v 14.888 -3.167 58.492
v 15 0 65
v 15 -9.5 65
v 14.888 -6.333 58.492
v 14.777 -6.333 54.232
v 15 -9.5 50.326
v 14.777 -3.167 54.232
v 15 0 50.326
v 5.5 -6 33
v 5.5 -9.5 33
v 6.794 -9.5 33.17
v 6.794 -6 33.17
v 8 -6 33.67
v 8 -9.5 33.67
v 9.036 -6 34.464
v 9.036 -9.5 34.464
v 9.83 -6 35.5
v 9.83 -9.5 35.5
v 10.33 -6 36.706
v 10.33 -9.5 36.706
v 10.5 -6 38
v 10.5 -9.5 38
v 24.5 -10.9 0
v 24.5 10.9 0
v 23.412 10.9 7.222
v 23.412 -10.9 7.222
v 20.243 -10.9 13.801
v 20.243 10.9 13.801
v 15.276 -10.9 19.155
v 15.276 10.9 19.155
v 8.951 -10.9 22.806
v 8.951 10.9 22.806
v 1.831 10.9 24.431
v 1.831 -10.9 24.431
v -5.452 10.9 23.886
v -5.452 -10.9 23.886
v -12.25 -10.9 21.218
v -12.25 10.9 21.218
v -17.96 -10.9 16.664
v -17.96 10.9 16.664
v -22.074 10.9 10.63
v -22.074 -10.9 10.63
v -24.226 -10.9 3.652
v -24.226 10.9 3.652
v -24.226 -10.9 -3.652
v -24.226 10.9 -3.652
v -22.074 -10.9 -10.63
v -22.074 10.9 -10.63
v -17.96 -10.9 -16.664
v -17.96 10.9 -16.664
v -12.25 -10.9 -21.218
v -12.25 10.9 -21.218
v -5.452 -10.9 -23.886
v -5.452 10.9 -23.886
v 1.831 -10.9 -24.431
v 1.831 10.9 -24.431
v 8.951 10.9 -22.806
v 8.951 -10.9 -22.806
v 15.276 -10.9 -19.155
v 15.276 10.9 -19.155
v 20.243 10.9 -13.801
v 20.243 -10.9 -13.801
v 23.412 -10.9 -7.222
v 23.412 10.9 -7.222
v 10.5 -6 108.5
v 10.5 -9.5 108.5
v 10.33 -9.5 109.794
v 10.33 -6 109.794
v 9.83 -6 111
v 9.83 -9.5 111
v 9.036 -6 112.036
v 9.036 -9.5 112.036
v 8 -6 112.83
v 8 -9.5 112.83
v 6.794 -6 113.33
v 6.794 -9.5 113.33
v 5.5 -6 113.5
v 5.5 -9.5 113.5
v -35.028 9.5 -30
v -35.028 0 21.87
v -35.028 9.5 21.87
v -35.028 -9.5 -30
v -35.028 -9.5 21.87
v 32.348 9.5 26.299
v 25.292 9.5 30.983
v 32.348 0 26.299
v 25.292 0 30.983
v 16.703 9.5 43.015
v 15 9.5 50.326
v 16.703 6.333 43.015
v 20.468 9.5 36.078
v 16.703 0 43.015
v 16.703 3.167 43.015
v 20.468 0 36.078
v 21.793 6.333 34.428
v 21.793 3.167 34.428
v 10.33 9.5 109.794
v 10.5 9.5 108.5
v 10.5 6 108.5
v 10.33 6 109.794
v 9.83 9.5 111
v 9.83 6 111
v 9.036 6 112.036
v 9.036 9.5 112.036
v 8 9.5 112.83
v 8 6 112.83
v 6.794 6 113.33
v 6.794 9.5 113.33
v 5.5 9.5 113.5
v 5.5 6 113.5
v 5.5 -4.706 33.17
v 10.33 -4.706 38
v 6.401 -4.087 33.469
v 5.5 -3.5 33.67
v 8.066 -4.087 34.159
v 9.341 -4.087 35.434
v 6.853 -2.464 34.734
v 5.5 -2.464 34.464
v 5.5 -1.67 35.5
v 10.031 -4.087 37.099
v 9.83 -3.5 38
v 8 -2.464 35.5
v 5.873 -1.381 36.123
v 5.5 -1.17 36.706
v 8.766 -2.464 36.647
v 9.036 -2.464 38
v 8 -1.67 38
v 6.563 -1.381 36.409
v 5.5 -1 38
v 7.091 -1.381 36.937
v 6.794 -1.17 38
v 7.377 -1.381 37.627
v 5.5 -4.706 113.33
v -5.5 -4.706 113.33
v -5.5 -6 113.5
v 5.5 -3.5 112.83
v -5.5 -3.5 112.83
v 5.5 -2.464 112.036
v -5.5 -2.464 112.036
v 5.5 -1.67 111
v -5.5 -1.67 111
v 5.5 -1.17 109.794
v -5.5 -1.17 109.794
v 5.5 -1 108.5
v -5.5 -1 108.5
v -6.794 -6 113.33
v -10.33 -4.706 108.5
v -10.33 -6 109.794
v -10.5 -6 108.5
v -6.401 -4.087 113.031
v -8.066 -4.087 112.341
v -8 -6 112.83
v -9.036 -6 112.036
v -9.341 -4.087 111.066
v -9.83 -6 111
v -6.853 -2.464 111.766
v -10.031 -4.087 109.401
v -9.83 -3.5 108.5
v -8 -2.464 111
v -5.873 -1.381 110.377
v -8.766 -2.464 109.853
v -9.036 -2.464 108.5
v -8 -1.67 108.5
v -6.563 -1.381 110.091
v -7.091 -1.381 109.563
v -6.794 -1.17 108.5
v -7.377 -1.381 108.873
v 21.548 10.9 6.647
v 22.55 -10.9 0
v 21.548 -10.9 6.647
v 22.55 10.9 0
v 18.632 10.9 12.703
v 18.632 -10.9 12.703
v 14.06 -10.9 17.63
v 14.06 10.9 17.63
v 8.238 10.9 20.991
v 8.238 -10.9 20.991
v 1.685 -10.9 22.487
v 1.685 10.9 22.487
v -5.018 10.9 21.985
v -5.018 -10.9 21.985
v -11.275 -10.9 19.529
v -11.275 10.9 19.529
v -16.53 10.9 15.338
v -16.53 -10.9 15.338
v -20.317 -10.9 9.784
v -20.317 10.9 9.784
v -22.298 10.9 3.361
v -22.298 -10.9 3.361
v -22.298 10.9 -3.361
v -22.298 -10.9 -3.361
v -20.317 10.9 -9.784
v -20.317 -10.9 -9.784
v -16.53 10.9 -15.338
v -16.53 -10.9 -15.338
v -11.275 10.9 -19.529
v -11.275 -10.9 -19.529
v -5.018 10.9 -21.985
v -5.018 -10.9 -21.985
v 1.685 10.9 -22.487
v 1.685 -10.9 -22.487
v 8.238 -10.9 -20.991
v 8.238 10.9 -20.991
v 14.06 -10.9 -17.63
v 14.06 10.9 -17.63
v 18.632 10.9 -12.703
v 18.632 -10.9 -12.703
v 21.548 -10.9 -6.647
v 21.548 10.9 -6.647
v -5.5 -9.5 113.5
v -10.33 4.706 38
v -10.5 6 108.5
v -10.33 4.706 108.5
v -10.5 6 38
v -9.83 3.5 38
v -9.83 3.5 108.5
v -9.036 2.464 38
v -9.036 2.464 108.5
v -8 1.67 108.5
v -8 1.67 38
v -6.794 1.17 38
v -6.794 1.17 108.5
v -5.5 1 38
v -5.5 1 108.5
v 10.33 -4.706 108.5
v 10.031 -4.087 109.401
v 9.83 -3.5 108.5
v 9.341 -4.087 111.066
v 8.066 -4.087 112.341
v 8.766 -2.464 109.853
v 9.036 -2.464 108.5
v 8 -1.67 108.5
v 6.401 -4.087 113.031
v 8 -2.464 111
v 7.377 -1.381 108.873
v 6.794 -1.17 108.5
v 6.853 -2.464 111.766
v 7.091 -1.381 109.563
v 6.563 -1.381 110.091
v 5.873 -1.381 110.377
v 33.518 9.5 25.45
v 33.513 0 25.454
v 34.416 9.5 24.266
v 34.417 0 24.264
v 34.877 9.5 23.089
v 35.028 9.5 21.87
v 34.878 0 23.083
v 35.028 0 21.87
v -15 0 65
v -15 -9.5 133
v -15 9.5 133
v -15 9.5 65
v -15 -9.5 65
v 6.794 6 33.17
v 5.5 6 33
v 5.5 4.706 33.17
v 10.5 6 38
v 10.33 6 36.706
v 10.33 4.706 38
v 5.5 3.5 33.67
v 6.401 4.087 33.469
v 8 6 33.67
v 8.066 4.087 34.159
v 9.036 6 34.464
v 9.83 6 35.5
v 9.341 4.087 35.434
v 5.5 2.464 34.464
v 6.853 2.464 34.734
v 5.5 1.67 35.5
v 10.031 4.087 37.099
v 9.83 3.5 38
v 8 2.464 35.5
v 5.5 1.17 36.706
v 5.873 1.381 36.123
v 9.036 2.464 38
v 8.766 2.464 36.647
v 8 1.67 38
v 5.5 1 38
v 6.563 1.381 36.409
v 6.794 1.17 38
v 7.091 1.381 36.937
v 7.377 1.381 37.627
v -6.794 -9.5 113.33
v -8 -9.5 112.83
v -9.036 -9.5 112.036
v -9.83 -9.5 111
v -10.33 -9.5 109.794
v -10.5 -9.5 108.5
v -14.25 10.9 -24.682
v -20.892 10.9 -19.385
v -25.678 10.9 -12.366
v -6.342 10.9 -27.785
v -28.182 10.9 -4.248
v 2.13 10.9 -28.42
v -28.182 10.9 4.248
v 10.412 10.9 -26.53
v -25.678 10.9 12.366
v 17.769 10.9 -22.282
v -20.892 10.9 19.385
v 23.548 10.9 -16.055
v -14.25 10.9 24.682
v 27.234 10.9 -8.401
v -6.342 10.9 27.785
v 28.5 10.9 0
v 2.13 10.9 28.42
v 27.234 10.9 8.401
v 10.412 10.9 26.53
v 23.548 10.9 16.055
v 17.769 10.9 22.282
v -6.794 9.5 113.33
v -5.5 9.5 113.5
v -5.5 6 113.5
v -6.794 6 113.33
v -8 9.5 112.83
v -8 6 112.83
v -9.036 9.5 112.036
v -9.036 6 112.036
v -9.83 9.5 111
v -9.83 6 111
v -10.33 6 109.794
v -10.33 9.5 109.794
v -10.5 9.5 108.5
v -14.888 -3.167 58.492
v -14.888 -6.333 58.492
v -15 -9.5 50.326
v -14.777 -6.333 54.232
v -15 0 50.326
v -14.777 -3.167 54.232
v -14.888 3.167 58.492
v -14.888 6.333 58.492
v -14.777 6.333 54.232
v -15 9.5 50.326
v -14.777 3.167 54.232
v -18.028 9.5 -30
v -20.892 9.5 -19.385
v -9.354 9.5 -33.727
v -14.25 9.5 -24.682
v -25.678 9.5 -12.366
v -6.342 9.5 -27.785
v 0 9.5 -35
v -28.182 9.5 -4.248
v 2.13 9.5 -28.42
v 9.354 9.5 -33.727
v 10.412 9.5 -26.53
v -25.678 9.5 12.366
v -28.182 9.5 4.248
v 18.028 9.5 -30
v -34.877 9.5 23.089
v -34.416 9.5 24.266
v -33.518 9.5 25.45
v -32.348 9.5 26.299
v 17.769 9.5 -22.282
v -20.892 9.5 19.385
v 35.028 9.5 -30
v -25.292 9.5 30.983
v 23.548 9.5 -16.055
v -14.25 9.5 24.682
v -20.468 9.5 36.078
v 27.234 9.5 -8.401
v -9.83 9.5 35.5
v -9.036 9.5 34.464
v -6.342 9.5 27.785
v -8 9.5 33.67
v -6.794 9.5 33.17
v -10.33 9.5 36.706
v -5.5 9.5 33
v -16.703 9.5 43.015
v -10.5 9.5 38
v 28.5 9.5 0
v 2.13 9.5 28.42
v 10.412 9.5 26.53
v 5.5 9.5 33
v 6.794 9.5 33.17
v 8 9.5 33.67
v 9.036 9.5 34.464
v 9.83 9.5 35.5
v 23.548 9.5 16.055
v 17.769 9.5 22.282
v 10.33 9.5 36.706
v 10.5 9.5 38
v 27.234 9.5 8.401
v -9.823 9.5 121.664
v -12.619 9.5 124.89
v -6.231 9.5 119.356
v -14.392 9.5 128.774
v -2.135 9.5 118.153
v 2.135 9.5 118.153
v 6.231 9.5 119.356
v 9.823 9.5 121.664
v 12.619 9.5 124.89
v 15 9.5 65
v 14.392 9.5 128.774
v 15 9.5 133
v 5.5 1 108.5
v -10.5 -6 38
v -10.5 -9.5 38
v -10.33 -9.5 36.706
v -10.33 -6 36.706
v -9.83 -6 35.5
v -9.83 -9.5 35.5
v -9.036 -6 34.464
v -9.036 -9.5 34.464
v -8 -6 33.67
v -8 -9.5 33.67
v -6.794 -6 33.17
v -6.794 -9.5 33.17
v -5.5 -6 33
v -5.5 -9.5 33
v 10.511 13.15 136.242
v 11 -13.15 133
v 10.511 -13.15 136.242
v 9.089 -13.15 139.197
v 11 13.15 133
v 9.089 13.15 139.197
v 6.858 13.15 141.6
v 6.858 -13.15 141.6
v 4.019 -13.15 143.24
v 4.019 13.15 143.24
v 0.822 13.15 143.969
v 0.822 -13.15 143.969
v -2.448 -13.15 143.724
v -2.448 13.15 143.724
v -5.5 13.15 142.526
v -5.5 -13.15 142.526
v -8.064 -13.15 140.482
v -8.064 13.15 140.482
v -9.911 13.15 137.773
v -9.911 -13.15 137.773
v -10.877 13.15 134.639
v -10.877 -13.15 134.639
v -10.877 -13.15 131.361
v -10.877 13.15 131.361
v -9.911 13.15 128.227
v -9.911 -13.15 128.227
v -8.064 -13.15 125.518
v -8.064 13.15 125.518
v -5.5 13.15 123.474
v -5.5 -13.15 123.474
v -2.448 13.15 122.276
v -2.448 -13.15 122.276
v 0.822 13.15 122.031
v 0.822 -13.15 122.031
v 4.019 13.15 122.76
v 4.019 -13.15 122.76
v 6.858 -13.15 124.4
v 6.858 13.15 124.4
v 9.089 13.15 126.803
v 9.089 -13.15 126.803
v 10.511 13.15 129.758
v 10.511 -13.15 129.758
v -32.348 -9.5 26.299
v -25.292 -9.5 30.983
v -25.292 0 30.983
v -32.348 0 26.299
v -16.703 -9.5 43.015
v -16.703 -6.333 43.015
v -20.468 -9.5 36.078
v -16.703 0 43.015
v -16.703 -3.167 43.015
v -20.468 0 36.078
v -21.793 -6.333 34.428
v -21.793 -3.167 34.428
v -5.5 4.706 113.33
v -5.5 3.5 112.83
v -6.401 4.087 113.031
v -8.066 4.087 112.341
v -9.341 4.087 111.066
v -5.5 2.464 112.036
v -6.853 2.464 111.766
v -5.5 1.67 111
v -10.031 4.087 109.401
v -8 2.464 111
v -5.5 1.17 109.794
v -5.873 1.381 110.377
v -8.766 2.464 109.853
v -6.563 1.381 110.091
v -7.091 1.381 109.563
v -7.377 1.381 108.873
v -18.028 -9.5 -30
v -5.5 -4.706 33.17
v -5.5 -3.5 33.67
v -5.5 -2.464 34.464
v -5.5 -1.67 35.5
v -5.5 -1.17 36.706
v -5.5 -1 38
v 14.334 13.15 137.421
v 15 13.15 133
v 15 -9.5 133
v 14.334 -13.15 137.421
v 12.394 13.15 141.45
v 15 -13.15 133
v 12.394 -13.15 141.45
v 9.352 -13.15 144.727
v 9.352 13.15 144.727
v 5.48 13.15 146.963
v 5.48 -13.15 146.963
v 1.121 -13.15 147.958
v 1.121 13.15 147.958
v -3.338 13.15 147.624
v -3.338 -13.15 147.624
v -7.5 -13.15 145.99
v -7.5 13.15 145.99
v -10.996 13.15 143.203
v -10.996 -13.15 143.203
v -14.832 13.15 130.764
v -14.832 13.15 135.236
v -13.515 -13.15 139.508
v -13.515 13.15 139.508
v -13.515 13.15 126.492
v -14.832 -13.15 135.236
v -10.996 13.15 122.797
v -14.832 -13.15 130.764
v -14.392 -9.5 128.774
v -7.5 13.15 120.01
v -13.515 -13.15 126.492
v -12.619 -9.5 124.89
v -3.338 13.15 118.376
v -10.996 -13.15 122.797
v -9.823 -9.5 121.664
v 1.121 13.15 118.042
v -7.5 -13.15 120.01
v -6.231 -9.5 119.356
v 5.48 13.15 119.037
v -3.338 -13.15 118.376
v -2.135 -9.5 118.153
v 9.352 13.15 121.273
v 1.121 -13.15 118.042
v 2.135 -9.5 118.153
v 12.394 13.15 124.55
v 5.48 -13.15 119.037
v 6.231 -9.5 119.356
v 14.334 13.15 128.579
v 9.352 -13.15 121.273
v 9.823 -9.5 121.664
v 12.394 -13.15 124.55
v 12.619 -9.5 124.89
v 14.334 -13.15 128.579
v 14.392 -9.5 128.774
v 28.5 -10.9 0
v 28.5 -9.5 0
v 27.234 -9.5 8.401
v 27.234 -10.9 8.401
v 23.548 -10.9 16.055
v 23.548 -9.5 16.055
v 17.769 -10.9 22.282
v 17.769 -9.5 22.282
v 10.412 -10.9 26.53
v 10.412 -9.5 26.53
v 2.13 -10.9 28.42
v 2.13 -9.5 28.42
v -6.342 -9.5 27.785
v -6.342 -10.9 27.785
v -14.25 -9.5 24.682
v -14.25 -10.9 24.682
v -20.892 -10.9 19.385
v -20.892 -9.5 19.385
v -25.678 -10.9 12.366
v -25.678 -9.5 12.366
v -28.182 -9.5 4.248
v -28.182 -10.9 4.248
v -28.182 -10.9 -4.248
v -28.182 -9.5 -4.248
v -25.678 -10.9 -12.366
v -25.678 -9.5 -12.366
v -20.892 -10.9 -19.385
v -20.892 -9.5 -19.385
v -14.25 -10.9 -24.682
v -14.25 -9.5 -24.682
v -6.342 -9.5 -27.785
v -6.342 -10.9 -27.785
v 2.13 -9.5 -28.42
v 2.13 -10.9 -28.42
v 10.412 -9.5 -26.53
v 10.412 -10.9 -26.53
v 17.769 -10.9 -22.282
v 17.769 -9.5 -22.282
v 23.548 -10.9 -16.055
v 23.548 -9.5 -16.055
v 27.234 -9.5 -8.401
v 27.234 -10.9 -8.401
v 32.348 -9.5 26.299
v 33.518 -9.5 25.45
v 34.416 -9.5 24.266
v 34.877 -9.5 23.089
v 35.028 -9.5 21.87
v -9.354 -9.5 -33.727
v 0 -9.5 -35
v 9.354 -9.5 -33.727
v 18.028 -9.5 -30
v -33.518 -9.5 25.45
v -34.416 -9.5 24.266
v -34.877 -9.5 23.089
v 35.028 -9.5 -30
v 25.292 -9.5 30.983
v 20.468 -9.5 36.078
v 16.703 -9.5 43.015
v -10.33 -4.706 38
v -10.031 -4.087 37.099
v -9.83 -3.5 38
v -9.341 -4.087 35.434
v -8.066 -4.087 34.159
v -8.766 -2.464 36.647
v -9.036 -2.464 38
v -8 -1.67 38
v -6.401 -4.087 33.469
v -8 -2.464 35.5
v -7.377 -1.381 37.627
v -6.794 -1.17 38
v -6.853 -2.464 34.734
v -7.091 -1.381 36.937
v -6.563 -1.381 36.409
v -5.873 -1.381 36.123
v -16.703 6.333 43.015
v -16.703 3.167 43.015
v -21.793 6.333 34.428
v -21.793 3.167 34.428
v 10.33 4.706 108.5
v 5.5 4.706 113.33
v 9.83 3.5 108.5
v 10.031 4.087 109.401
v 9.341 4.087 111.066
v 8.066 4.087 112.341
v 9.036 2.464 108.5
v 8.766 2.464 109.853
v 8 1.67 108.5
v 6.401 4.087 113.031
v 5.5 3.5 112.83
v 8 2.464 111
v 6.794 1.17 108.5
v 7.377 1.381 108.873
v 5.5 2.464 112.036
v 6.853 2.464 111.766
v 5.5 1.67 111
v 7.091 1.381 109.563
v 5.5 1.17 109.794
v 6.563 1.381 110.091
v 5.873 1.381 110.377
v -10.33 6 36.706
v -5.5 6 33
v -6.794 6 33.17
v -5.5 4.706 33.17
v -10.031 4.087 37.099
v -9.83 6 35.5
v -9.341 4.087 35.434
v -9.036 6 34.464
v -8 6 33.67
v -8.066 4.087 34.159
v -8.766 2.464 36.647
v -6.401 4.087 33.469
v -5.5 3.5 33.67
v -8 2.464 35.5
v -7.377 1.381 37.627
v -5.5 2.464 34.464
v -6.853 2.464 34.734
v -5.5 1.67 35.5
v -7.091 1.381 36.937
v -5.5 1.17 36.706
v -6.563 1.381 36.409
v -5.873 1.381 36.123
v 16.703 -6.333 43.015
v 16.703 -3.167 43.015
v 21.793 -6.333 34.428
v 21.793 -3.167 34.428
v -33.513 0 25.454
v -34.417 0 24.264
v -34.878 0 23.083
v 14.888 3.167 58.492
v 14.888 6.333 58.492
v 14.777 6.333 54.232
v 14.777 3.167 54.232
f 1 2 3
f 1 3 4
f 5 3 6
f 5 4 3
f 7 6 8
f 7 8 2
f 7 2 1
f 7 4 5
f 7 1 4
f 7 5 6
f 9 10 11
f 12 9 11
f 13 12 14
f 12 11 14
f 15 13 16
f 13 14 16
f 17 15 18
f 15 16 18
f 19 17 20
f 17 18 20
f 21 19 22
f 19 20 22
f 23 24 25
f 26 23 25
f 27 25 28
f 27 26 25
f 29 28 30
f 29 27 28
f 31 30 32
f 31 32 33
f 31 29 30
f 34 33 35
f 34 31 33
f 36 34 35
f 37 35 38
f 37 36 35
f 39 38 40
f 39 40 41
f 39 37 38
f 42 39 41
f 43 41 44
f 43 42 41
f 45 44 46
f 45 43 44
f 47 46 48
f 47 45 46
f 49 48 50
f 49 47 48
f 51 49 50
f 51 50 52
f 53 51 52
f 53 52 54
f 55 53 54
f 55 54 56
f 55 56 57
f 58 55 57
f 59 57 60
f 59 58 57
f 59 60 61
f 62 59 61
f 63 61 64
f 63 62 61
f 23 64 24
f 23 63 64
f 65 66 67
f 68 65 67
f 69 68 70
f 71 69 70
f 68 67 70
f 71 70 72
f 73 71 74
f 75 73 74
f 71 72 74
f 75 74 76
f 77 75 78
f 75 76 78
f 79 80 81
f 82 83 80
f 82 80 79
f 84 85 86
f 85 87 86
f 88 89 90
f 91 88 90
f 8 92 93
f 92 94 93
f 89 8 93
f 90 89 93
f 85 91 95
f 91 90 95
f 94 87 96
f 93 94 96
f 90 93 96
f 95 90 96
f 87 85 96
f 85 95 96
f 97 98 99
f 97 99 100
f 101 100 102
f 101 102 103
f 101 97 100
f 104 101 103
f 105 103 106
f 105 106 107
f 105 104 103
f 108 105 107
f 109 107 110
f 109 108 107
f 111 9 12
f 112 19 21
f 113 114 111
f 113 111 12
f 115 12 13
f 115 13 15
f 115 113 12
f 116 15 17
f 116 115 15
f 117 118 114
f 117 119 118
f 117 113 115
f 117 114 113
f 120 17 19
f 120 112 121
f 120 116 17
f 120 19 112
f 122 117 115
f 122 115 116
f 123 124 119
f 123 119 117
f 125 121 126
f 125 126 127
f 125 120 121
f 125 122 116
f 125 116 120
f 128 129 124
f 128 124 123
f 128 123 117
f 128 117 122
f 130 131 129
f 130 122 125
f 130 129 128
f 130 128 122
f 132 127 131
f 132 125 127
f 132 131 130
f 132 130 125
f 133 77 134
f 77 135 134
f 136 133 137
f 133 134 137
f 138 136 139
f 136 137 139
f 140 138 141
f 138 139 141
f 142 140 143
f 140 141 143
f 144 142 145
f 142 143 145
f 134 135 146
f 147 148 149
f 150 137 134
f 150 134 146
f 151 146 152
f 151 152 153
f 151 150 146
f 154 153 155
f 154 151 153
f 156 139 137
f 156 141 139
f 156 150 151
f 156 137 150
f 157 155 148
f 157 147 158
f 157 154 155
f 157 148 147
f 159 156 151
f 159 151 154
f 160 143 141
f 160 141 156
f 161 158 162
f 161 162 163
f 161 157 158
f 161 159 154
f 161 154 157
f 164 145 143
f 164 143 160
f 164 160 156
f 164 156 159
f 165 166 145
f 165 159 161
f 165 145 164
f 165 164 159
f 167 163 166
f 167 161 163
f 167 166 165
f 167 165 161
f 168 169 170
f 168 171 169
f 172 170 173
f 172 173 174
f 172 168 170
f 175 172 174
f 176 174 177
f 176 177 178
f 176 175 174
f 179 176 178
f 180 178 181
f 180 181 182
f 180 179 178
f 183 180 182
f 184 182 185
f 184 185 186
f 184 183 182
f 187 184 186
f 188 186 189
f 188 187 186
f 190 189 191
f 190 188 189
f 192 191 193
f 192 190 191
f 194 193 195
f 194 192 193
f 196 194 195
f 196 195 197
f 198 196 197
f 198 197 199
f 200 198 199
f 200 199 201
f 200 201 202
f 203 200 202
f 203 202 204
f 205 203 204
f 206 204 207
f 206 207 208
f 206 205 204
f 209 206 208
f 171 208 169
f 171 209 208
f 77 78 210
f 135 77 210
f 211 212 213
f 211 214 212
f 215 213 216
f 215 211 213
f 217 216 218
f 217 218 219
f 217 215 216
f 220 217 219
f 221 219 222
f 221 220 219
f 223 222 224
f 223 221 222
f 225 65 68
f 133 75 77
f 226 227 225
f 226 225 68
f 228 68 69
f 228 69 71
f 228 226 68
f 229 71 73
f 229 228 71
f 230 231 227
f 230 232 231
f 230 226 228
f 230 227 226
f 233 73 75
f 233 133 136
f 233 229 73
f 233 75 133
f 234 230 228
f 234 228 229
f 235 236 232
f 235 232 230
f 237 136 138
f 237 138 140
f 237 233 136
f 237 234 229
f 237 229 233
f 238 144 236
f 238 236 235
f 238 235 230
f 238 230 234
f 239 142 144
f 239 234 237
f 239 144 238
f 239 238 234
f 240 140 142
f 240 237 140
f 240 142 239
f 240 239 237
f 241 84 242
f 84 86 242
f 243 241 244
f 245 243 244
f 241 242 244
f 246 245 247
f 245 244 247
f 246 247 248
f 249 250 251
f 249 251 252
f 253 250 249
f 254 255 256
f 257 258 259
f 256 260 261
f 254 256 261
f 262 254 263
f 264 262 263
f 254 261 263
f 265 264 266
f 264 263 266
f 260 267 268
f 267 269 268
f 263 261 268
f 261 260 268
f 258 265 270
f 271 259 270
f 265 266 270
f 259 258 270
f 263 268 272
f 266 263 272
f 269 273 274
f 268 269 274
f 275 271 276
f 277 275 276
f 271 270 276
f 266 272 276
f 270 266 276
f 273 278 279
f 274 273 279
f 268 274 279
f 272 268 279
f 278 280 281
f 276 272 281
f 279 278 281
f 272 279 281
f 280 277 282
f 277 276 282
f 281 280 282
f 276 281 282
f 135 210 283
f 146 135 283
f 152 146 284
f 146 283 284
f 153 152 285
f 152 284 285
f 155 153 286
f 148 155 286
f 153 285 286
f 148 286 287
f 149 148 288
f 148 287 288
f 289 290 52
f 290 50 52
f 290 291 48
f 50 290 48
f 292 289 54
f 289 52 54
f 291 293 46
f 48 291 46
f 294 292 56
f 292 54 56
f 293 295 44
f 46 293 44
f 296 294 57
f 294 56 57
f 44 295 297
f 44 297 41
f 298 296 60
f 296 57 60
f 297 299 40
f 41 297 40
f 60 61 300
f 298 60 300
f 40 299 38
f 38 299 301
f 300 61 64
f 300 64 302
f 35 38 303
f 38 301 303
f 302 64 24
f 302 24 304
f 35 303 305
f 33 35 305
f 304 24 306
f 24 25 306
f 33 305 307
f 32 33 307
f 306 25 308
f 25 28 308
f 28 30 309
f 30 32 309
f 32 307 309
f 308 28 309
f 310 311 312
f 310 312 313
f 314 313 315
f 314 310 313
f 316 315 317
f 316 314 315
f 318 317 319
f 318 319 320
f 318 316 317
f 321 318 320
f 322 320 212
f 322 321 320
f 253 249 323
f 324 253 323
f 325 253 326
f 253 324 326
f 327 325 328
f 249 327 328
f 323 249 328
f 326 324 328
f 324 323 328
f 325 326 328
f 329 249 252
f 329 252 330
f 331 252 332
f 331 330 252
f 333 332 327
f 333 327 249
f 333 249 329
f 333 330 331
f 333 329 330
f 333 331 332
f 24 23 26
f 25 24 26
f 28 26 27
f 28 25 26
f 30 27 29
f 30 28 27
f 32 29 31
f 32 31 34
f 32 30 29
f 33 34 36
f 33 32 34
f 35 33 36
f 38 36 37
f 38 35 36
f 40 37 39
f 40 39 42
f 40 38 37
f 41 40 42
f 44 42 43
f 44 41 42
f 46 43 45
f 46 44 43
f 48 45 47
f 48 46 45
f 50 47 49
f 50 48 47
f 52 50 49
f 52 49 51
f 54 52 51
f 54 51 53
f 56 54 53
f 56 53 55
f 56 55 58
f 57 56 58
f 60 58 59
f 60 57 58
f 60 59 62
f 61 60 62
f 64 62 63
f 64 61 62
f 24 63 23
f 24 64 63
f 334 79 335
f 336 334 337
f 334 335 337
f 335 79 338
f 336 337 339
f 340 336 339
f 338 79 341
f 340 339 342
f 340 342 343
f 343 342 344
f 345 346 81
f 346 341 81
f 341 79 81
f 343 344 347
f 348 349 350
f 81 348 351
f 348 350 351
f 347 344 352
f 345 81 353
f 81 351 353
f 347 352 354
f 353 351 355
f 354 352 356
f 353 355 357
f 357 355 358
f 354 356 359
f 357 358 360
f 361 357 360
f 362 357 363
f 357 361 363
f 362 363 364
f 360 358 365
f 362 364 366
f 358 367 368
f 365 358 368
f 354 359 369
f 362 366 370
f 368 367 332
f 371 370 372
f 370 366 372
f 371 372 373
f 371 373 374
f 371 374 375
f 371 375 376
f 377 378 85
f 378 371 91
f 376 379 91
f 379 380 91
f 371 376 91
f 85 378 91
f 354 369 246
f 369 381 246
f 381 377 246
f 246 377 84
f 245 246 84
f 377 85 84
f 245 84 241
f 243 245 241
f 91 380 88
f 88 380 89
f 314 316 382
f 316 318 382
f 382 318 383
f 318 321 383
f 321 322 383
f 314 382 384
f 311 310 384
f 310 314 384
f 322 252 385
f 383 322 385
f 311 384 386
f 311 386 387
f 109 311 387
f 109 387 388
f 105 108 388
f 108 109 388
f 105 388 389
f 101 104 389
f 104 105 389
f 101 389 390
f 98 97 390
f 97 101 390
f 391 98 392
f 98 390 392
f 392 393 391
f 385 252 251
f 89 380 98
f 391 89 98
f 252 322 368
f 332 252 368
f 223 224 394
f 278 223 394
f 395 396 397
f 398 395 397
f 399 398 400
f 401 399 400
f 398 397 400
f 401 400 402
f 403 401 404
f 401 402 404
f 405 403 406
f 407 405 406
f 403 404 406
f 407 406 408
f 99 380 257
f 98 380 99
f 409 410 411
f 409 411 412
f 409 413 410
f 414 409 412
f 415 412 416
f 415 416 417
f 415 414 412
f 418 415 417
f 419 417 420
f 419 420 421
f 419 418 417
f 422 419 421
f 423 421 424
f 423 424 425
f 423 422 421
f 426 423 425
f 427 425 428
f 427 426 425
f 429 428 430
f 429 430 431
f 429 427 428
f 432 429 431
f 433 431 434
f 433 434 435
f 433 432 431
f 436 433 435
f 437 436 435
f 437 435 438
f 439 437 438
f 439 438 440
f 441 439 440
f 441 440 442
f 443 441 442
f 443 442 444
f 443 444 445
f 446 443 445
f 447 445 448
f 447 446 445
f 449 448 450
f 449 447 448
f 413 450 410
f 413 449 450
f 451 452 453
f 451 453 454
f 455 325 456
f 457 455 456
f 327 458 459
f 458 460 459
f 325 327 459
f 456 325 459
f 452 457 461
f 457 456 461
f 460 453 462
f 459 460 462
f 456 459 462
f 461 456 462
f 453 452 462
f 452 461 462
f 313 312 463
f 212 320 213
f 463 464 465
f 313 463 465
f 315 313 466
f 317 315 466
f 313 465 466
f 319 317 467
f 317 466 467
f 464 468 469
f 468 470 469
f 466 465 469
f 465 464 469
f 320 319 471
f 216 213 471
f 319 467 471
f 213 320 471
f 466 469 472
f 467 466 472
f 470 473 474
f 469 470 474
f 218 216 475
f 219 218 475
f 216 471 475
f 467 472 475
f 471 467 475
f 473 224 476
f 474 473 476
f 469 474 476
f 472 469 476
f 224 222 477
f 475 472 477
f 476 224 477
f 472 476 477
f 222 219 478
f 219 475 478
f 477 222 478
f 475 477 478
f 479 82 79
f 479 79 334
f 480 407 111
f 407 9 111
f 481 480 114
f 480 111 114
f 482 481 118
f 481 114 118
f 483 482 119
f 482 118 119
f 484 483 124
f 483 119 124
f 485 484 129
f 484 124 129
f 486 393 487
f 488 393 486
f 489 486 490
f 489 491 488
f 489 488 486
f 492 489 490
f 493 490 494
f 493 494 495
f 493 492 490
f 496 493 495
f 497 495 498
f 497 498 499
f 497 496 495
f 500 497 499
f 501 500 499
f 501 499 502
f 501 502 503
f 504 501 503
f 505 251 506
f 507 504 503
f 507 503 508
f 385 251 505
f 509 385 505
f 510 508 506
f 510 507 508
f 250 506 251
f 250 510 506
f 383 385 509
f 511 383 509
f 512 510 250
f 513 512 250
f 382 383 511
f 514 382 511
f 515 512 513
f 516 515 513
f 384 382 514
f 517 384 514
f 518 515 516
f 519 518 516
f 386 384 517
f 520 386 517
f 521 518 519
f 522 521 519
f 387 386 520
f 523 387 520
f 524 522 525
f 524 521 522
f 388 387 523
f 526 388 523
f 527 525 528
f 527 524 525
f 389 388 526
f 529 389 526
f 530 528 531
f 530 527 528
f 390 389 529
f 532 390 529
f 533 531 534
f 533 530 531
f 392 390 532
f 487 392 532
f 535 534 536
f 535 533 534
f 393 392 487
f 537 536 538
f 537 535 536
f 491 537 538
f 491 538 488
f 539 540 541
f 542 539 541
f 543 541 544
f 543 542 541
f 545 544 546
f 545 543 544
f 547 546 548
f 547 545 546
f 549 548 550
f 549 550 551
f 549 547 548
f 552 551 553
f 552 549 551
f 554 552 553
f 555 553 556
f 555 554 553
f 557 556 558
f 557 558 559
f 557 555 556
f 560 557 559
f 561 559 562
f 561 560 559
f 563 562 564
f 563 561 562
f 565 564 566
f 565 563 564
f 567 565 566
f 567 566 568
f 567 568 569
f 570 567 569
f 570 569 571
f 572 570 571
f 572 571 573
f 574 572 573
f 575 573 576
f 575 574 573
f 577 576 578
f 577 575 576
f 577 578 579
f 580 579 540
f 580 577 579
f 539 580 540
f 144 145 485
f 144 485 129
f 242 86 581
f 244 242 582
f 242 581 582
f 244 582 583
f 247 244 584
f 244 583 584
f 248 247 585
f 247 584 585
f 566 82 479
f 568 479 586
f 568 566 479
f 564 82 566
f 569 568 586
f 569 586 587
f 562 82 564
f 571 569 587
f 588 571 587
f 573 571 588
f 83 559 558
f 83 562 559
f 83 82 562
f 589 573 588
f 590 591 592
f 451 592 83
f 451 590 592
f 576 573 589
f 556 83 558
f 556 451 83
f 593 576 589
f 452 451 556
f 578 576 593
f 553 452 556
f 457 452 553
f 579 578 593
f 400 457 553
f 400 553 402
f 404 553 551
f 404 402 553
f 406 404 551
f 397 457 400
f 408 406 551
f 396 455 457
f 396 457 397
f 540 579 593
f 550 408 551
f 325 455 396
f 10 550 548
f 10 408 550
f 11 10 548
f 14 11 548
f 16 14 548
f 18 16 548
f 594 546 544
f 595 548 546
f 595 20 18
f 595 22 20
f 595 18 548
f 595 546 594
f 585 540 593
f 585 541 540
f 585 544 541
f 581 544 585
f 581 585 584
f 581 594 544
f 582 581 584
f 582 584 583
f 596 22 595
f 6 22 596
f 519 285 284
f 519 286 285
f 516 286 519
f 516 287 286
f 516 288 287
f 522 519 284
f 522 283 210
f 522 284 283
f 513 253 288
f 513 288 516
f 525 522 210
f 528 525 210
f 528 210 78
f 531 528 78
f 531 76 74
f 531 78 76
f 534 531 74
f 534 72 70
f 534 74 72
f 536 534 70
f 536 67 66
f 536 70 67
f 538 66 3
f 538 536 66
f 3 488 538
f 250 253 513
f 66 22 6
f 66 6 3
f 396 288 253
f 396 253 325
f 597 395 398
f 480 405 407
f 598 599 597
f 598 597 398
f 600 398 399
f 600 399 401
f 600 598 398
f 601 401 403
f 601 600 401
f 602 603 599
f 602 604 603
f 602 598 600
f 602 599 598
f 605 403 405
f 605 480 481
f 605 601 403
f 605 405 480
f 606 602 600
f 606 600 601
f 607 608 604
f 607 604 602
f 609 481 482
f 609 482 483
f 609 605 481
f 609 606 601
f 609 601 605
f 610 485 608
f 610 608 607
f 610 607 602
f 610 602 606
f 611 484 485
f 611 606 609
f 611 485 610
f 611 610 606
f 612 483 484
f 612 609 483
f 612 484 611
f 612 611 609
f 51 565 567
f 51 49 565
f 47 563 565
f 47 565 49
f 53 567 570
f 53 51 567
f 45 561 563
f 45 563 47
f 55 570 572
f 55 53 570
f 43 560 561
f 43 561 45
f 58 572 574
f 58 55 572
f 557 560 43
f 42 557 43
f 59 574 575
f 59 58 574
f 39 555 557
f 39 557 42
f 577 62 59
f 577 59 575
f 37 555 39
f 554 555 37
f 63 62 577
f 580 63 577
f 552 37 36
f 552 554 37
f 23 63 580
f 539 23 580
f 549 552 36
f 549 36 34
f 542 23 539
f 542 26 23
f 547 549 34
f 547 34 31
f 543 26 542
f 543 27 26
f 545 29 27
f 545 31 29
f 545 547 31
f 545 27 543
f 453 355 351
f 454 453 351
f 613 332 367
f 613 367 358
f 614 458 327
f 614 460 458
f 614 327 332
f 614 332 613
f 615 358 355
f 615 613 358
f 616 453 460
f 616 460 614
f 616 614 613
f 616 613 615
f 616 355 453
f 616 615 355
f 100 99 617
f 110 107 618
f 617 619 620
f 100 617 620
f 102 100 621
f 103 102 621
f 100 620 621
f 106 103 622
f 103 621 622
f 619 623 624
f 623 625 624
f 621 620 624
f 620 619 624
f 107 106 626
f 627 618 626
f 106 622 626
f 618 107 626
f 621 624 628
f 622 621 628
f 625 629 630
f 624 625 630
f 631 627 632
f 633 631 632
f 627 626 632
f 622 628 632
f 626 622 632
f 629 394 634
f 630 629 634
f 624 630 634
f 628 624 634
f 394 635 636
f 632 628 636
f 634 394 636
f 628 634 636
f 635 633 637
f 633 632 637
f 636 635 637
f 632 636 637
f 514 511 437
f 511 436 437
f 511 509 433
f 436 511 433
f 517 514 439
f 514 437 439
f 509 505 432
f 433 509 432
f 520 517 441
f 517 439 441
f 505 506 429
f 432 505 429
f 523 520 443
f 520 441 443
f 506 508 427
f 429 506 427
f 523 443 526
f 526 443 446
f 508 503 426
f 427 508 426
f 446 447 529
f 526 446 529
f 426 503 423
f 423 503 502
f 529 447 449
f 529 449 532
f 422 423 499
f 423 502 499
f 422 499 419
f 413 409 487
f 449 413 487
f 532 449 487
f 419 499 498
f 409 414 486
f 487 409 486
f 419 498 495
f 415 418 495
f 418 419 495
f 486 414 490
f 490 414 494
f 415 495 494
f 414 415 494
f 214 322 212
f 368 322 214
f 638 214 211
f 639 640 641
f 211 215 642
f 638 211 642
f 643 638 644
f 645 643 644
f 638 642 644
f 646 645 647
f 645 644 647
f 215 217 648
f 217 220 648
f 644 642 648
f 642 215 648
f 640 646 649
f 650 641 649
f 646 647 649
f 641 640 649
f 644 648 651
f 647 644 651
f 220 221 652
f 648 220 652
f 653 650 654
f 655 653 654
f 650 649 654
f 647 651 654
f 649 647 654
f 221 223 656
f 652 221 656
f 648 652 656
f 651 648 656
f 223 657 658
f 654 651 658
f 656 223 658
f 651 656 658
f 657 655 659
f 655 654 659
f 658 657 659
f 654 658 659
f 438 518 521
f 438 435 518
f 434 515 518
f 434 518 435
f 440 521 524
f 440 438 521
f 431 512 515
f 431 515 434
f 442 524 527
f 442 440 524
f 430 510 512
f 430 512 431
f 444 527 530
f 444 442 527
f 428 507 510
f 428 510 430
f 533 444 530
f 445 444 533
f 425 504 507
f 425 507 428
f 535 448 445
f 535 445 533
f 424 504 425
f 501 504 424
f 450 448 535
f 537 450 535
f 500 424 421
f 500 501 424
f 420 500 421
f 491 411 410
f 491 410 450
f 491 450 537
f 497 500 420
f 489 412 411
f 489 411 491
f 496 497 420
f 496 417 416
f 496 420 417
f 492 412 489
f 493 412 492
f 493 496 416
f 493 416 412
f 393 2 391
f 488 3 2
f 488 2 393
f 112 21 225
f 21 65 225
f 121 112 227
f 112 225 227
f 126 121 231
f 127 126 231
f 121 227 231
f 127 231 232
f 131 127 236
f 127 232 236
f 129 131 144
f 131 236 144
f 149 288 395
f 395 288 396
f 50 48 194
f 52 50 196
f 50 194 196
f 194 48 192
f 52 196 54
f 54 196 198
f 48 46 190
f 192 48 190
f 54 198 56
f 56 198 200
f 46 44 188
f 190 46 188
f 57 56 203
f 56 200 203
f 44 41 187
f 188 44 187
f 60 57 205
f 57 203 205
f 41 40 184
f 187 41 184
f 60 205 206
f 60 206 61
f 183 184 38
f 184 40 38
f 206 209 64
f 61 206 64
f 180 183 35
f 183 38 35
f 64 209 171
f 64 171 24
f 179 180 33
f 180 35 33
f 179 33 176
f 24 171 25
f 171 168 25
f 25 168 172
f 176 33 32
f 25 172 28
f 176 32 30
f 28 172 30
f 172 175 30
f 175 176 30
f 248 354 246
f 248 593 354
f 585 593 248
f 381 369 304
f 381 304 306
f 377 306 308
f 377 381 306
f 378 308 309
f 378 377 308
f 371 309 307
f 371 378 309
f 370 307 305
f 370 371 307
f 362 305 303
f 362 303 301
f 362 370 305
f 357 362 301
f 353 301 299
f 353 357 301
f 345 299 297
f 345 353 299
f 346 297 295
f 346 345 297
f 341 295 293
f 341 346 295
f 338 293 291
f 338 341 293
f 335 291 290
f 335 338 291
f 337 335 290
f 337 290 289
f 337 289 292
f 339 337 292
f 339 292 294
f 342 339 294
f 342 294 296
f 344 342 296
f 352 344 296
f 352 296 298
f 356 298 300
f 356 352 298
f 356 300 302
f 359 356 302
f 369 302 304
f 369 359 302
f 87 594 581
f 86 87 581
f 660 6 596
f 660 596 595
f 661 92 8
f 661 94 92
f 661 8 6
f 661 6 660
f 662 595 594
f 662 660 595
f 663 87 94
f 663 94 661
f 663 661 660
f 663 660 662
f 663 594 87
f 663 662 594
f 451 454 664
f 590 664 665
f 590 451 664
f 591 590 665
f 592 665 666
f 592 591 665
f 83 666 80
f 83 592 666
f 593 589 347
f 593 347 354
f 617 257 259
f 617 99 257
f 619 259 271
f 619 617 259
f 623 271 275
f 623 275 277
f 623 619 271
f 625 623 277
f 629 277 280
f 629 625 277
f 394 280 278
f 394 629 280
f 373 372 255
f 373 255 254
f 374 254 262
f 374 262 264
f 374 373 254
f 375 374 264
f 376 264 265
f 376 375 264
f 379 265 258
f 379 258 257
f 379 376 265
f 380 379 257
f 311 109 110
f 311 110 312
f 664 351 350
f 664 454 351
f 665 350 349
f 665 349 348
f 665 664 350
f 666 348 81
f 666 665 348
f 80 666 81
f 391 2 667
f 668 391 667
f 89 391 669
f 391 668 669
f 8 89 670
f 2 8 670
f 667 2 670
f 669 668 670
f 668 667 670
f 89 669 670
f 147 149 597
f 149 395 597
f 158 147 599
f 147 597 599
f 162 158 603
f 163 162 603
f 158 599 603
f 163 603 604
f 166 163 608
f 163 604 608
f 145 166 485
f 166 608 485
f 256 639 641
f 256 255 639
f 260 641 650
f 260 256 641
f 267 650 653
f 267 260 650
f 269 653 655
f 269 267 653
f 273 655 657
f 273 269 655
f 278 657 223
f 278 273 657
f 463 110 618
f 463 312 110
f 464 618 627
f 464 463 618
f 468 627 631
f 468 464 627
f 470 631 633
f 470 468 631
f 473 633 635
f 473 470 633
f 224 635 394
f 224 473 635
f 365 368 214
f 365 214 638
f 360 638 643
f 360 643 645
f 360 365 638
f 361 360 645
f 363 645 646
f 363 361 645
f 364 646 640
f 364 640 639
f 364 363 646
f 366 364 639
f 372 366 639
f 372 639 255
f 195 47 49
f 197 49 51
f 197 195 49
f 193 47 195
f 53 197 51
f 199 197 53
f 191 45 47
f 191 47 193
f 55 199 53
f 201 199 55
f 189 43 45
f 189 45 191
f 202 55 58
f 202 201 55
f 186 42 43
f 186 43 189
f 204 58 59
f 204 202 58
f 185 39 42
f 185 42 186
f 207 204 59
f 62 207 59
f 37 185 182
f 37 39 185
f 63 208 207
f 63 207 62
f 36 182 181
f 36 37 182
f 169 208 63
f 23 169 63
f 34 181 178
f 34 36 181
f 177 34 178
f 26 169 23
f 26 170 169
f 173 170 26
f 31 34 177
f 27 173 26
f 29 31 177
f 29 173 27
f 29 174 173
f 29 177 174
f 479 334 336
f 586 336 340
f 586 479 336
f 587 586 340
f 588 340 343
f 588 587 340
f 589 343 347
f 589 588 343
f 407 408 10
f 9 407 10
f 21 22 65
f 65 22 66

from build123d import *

# Parameters (mm, degrees)
F0_R     = 28.5
F1_DEPTH = 9.5
F0_R_2   = 24.5
F2_DEPTH = 10.9
F0_R_3   = 11
F3_DEPTH = 13.15
F0_R_4   = 22.55
F4_DEPTH = 10.9
F6_DEPTH = 8.5
F7_R     = 5
F9_R     = 5


# Not quite as in the source:
# - a feature of the source that left no trace in its solid (it failed there, or was rolled back) is left out
# - a pattern or mirror of a feature is missing from the dataset's text; its kind, count and spacing are read off the source's solid


with BuildPart() as f1:
    # F0 (on Front) → F1 (new body, symmetric)
    with BuildSketch(Plane.XZ):
        with BuildLine():
            Line((15, 65), (15, 133))
            ThreePointArc((15, 133), (0, 118), (-15, 133))
            Line((-15, 133), (-15, 65))
            add(Edge.make_bspline(
                [(-15, 65), (-15, 56.7374224028), (-14.4979846104, 54.6858215893), (-15, 50.3263995051)],
                knots=[0, 0, 0, 0, 0.4026758, 0.4026758, 0.4026758, 0.4026758], degree=3))
            Line((-15, 50.3263995051), (-15, 31.6227766017))
            ThreePointArc((-15, 31.6227766017), (0, 35), (15, 31.6227766017))
            Line((15, 31.6227766017), (15, 50.3263995051))
            add(Edge.make_bspline(
                [(15, 65), (15, 56.7374224028), (14.4979846104, 54.6858215893), (15, 50.3263995051)],
                knots=[0, 0, 0, 0, 0.4026758, 0.4026758, 0.4026758, 0.4026758], degree=3))
        make_face()
        with BuildLine():
            Line((-15, 31.6227766017), (-15, 50.3263995051))
            add(Edge.make_bspline(
                [(-15, 50.3263995051), (-15.7446832935, 43.8596878017), (-18.6986741861, 32.3147582025), (-35.0277563773, 25)],
                knots=[0.4026758, 0.4026758, 0.4026758, 0.4026758, 1, 1, 1, 1], degree=3))
            Line((-35.0277563773, 25), (-35.0277563773, -30))
            Line((-35.0277563773, -30), (-18.0277563773, -30))
            ThreePointArc((-18.0277563773, -30), (-34.9578291925, 1.7176082629), (-15, 31.6227766017))
        make_face()
        with BuildLine():
            add(Edge.make_bspline(
                [(15, 50.3263995051), (15.7446832935, 43.8596878017), (18.6986741861, 32.3147582025), (35.0277563773, 25)],
                knots=[0.4026758, 0.4026758, 0.4026758, 0.4026758, 1, 1, 1, 1], degree=3))
            Line((15, 50.3263995051), (15, 31.6227766017))
            ThreePointArc((15, 31.6227766017), (29.5803989155, 18.7082869339), (35, 0))
            ThreePointArc((35, 0), (30.4628583131, -17.2341017578), (18.0277563773, -30))
            Line((18.0277563773, -30), (35.0277563773, -30))
            Line((35.0277563773, -30), (35.0277563773, 25))
        make_face()
        with BuildLine():
            ThreePointArc((35, 0), (29.5803989155, 18.7082869339), (15, 31.6227766017))
            ThreePointArc((15, 31.6227766017), (0, 35), (-15, 31.6227766017))
            ThreePointArc((-15, 31.6227766017), (-34.9578291925, 1.7176082629), (-18.0277563773, -30))
            ThreePointArc((-18.0277563773, -30), (0, -35), (18.0277563773, -30))
            ThreePointArc((18.0277563773, -30), (30.4628583131, -17.2341017578), (35, 0))
        make_face()
        Circle(F0_R, mode=Mode.SUBTRACT)
    extrude(amount=F1_DEPTH, both=True)

    # F0 (on Front) → F2 (join, symmetric)
    with BuildSketch(Plane.XZ):
        Circle(F0_R)
        Circle(F0_R_2, mode=Mode.SUBTRACT)
    extrude(amount=F2_DEPTH, both=True)

    # F0 (on Front) → F3 (join, symmetric)
    with BuildSketch(Plane.XZ):
        with BuildLine():
            ThreePointArc((-15, 133), (0, 118), (15, 133))
            ThreePointArc((15, 133), (0, 148), (-15, 133))
        make_face()
        with Locations((0, 133)):
            Circle(F0_R_3, mode=Mode.SUBTRACT)
    extrude(amount=F3_DEPTH, both=True)

    # F5 (on face) → F6 (cut)
    with BuildSketch(Plane.XZ.offset(9.5)):
        with BuildLine():
            Line((5.5, 113.5), (-5.5, 113.5))
            ThreePointArc((-5.5, 113.5), (-9.0355339059, 112.0355339059), (-10.5, 108.5))
            Line((-10.5, 108.5), (-10.5, 38))
            ThreePointArc((-10.5, 38), (-9.0355339059, 34.4644660941), (-5.5, 33))
            Line((-5.5, 33), (5.5, 33))
            ThreePointArc((5.5, 33), (9.0355339059, 34.4644660941), (10.5, 38))
            Line((10.5, 38), (10.5, 108.5))
            ThreePointArc((10.5, 108.5), (9.0355339059, 112.0355339059), (5.5, 113.5))
        make_face()
    f6 = extrude(amount=-F6_DEPTH, mode=Mode.SUBTRACT)

    # F6_copies: F6 across plane
    add(f6.mirror(Plane.ZX), mode=Mode.SUBTRACT)

    # F7
    f7_edges = [f1.edges().sort_by_distance(p)[0] for p in [
        (10.5, -1, 73.25),
        (0, -1, 113.5),
        (9.035534, -1, 112.035534),
        (-9.035534, -1, 112.035534),
        (-10.5, -1, 73.25),
        (-9.035534, -1, 34.464466),
        (0, -1, 33),
        (9.035534, -1, 34.464466),
    ]]
    fillet(f7_edges, radius=F7_R)

    # F9
    f9_edges = [f1.edges().sort_by_distance(p)[0] for p in [
        (35.027756, -4.75, 25),
        (35.027756, 4.75, 25),
        (-35.027756, -4.75, 25),
        (-35.027756, 4.75, 25),
        (9.035534, 1, 112.035534),
        (0, 1, 113.5),
        (-9.035534, 1, 112.035534),
        (-10.5, 1, 73.25),
        (-9.035534, 1, 34.464466),
        (0, 1, 33),
        (9.035534, 1, 34.464466),
        (10.5, 1, 73.25),
    ]]
    fillet(f9_edges, radius=F9_R)


with BuildPart() as f4:
    # F0 (on Front) → F4 (new body, symmetric)
    with BuildSketch(Plane.XZ):
        Circle(F0_R_2)
        Circle(F0_R_4, mode=Mode.SUBTRACT)
    extrude(amount=F4_DEPTH, both=True)


solid = Compound([f1.part, f4.part])
